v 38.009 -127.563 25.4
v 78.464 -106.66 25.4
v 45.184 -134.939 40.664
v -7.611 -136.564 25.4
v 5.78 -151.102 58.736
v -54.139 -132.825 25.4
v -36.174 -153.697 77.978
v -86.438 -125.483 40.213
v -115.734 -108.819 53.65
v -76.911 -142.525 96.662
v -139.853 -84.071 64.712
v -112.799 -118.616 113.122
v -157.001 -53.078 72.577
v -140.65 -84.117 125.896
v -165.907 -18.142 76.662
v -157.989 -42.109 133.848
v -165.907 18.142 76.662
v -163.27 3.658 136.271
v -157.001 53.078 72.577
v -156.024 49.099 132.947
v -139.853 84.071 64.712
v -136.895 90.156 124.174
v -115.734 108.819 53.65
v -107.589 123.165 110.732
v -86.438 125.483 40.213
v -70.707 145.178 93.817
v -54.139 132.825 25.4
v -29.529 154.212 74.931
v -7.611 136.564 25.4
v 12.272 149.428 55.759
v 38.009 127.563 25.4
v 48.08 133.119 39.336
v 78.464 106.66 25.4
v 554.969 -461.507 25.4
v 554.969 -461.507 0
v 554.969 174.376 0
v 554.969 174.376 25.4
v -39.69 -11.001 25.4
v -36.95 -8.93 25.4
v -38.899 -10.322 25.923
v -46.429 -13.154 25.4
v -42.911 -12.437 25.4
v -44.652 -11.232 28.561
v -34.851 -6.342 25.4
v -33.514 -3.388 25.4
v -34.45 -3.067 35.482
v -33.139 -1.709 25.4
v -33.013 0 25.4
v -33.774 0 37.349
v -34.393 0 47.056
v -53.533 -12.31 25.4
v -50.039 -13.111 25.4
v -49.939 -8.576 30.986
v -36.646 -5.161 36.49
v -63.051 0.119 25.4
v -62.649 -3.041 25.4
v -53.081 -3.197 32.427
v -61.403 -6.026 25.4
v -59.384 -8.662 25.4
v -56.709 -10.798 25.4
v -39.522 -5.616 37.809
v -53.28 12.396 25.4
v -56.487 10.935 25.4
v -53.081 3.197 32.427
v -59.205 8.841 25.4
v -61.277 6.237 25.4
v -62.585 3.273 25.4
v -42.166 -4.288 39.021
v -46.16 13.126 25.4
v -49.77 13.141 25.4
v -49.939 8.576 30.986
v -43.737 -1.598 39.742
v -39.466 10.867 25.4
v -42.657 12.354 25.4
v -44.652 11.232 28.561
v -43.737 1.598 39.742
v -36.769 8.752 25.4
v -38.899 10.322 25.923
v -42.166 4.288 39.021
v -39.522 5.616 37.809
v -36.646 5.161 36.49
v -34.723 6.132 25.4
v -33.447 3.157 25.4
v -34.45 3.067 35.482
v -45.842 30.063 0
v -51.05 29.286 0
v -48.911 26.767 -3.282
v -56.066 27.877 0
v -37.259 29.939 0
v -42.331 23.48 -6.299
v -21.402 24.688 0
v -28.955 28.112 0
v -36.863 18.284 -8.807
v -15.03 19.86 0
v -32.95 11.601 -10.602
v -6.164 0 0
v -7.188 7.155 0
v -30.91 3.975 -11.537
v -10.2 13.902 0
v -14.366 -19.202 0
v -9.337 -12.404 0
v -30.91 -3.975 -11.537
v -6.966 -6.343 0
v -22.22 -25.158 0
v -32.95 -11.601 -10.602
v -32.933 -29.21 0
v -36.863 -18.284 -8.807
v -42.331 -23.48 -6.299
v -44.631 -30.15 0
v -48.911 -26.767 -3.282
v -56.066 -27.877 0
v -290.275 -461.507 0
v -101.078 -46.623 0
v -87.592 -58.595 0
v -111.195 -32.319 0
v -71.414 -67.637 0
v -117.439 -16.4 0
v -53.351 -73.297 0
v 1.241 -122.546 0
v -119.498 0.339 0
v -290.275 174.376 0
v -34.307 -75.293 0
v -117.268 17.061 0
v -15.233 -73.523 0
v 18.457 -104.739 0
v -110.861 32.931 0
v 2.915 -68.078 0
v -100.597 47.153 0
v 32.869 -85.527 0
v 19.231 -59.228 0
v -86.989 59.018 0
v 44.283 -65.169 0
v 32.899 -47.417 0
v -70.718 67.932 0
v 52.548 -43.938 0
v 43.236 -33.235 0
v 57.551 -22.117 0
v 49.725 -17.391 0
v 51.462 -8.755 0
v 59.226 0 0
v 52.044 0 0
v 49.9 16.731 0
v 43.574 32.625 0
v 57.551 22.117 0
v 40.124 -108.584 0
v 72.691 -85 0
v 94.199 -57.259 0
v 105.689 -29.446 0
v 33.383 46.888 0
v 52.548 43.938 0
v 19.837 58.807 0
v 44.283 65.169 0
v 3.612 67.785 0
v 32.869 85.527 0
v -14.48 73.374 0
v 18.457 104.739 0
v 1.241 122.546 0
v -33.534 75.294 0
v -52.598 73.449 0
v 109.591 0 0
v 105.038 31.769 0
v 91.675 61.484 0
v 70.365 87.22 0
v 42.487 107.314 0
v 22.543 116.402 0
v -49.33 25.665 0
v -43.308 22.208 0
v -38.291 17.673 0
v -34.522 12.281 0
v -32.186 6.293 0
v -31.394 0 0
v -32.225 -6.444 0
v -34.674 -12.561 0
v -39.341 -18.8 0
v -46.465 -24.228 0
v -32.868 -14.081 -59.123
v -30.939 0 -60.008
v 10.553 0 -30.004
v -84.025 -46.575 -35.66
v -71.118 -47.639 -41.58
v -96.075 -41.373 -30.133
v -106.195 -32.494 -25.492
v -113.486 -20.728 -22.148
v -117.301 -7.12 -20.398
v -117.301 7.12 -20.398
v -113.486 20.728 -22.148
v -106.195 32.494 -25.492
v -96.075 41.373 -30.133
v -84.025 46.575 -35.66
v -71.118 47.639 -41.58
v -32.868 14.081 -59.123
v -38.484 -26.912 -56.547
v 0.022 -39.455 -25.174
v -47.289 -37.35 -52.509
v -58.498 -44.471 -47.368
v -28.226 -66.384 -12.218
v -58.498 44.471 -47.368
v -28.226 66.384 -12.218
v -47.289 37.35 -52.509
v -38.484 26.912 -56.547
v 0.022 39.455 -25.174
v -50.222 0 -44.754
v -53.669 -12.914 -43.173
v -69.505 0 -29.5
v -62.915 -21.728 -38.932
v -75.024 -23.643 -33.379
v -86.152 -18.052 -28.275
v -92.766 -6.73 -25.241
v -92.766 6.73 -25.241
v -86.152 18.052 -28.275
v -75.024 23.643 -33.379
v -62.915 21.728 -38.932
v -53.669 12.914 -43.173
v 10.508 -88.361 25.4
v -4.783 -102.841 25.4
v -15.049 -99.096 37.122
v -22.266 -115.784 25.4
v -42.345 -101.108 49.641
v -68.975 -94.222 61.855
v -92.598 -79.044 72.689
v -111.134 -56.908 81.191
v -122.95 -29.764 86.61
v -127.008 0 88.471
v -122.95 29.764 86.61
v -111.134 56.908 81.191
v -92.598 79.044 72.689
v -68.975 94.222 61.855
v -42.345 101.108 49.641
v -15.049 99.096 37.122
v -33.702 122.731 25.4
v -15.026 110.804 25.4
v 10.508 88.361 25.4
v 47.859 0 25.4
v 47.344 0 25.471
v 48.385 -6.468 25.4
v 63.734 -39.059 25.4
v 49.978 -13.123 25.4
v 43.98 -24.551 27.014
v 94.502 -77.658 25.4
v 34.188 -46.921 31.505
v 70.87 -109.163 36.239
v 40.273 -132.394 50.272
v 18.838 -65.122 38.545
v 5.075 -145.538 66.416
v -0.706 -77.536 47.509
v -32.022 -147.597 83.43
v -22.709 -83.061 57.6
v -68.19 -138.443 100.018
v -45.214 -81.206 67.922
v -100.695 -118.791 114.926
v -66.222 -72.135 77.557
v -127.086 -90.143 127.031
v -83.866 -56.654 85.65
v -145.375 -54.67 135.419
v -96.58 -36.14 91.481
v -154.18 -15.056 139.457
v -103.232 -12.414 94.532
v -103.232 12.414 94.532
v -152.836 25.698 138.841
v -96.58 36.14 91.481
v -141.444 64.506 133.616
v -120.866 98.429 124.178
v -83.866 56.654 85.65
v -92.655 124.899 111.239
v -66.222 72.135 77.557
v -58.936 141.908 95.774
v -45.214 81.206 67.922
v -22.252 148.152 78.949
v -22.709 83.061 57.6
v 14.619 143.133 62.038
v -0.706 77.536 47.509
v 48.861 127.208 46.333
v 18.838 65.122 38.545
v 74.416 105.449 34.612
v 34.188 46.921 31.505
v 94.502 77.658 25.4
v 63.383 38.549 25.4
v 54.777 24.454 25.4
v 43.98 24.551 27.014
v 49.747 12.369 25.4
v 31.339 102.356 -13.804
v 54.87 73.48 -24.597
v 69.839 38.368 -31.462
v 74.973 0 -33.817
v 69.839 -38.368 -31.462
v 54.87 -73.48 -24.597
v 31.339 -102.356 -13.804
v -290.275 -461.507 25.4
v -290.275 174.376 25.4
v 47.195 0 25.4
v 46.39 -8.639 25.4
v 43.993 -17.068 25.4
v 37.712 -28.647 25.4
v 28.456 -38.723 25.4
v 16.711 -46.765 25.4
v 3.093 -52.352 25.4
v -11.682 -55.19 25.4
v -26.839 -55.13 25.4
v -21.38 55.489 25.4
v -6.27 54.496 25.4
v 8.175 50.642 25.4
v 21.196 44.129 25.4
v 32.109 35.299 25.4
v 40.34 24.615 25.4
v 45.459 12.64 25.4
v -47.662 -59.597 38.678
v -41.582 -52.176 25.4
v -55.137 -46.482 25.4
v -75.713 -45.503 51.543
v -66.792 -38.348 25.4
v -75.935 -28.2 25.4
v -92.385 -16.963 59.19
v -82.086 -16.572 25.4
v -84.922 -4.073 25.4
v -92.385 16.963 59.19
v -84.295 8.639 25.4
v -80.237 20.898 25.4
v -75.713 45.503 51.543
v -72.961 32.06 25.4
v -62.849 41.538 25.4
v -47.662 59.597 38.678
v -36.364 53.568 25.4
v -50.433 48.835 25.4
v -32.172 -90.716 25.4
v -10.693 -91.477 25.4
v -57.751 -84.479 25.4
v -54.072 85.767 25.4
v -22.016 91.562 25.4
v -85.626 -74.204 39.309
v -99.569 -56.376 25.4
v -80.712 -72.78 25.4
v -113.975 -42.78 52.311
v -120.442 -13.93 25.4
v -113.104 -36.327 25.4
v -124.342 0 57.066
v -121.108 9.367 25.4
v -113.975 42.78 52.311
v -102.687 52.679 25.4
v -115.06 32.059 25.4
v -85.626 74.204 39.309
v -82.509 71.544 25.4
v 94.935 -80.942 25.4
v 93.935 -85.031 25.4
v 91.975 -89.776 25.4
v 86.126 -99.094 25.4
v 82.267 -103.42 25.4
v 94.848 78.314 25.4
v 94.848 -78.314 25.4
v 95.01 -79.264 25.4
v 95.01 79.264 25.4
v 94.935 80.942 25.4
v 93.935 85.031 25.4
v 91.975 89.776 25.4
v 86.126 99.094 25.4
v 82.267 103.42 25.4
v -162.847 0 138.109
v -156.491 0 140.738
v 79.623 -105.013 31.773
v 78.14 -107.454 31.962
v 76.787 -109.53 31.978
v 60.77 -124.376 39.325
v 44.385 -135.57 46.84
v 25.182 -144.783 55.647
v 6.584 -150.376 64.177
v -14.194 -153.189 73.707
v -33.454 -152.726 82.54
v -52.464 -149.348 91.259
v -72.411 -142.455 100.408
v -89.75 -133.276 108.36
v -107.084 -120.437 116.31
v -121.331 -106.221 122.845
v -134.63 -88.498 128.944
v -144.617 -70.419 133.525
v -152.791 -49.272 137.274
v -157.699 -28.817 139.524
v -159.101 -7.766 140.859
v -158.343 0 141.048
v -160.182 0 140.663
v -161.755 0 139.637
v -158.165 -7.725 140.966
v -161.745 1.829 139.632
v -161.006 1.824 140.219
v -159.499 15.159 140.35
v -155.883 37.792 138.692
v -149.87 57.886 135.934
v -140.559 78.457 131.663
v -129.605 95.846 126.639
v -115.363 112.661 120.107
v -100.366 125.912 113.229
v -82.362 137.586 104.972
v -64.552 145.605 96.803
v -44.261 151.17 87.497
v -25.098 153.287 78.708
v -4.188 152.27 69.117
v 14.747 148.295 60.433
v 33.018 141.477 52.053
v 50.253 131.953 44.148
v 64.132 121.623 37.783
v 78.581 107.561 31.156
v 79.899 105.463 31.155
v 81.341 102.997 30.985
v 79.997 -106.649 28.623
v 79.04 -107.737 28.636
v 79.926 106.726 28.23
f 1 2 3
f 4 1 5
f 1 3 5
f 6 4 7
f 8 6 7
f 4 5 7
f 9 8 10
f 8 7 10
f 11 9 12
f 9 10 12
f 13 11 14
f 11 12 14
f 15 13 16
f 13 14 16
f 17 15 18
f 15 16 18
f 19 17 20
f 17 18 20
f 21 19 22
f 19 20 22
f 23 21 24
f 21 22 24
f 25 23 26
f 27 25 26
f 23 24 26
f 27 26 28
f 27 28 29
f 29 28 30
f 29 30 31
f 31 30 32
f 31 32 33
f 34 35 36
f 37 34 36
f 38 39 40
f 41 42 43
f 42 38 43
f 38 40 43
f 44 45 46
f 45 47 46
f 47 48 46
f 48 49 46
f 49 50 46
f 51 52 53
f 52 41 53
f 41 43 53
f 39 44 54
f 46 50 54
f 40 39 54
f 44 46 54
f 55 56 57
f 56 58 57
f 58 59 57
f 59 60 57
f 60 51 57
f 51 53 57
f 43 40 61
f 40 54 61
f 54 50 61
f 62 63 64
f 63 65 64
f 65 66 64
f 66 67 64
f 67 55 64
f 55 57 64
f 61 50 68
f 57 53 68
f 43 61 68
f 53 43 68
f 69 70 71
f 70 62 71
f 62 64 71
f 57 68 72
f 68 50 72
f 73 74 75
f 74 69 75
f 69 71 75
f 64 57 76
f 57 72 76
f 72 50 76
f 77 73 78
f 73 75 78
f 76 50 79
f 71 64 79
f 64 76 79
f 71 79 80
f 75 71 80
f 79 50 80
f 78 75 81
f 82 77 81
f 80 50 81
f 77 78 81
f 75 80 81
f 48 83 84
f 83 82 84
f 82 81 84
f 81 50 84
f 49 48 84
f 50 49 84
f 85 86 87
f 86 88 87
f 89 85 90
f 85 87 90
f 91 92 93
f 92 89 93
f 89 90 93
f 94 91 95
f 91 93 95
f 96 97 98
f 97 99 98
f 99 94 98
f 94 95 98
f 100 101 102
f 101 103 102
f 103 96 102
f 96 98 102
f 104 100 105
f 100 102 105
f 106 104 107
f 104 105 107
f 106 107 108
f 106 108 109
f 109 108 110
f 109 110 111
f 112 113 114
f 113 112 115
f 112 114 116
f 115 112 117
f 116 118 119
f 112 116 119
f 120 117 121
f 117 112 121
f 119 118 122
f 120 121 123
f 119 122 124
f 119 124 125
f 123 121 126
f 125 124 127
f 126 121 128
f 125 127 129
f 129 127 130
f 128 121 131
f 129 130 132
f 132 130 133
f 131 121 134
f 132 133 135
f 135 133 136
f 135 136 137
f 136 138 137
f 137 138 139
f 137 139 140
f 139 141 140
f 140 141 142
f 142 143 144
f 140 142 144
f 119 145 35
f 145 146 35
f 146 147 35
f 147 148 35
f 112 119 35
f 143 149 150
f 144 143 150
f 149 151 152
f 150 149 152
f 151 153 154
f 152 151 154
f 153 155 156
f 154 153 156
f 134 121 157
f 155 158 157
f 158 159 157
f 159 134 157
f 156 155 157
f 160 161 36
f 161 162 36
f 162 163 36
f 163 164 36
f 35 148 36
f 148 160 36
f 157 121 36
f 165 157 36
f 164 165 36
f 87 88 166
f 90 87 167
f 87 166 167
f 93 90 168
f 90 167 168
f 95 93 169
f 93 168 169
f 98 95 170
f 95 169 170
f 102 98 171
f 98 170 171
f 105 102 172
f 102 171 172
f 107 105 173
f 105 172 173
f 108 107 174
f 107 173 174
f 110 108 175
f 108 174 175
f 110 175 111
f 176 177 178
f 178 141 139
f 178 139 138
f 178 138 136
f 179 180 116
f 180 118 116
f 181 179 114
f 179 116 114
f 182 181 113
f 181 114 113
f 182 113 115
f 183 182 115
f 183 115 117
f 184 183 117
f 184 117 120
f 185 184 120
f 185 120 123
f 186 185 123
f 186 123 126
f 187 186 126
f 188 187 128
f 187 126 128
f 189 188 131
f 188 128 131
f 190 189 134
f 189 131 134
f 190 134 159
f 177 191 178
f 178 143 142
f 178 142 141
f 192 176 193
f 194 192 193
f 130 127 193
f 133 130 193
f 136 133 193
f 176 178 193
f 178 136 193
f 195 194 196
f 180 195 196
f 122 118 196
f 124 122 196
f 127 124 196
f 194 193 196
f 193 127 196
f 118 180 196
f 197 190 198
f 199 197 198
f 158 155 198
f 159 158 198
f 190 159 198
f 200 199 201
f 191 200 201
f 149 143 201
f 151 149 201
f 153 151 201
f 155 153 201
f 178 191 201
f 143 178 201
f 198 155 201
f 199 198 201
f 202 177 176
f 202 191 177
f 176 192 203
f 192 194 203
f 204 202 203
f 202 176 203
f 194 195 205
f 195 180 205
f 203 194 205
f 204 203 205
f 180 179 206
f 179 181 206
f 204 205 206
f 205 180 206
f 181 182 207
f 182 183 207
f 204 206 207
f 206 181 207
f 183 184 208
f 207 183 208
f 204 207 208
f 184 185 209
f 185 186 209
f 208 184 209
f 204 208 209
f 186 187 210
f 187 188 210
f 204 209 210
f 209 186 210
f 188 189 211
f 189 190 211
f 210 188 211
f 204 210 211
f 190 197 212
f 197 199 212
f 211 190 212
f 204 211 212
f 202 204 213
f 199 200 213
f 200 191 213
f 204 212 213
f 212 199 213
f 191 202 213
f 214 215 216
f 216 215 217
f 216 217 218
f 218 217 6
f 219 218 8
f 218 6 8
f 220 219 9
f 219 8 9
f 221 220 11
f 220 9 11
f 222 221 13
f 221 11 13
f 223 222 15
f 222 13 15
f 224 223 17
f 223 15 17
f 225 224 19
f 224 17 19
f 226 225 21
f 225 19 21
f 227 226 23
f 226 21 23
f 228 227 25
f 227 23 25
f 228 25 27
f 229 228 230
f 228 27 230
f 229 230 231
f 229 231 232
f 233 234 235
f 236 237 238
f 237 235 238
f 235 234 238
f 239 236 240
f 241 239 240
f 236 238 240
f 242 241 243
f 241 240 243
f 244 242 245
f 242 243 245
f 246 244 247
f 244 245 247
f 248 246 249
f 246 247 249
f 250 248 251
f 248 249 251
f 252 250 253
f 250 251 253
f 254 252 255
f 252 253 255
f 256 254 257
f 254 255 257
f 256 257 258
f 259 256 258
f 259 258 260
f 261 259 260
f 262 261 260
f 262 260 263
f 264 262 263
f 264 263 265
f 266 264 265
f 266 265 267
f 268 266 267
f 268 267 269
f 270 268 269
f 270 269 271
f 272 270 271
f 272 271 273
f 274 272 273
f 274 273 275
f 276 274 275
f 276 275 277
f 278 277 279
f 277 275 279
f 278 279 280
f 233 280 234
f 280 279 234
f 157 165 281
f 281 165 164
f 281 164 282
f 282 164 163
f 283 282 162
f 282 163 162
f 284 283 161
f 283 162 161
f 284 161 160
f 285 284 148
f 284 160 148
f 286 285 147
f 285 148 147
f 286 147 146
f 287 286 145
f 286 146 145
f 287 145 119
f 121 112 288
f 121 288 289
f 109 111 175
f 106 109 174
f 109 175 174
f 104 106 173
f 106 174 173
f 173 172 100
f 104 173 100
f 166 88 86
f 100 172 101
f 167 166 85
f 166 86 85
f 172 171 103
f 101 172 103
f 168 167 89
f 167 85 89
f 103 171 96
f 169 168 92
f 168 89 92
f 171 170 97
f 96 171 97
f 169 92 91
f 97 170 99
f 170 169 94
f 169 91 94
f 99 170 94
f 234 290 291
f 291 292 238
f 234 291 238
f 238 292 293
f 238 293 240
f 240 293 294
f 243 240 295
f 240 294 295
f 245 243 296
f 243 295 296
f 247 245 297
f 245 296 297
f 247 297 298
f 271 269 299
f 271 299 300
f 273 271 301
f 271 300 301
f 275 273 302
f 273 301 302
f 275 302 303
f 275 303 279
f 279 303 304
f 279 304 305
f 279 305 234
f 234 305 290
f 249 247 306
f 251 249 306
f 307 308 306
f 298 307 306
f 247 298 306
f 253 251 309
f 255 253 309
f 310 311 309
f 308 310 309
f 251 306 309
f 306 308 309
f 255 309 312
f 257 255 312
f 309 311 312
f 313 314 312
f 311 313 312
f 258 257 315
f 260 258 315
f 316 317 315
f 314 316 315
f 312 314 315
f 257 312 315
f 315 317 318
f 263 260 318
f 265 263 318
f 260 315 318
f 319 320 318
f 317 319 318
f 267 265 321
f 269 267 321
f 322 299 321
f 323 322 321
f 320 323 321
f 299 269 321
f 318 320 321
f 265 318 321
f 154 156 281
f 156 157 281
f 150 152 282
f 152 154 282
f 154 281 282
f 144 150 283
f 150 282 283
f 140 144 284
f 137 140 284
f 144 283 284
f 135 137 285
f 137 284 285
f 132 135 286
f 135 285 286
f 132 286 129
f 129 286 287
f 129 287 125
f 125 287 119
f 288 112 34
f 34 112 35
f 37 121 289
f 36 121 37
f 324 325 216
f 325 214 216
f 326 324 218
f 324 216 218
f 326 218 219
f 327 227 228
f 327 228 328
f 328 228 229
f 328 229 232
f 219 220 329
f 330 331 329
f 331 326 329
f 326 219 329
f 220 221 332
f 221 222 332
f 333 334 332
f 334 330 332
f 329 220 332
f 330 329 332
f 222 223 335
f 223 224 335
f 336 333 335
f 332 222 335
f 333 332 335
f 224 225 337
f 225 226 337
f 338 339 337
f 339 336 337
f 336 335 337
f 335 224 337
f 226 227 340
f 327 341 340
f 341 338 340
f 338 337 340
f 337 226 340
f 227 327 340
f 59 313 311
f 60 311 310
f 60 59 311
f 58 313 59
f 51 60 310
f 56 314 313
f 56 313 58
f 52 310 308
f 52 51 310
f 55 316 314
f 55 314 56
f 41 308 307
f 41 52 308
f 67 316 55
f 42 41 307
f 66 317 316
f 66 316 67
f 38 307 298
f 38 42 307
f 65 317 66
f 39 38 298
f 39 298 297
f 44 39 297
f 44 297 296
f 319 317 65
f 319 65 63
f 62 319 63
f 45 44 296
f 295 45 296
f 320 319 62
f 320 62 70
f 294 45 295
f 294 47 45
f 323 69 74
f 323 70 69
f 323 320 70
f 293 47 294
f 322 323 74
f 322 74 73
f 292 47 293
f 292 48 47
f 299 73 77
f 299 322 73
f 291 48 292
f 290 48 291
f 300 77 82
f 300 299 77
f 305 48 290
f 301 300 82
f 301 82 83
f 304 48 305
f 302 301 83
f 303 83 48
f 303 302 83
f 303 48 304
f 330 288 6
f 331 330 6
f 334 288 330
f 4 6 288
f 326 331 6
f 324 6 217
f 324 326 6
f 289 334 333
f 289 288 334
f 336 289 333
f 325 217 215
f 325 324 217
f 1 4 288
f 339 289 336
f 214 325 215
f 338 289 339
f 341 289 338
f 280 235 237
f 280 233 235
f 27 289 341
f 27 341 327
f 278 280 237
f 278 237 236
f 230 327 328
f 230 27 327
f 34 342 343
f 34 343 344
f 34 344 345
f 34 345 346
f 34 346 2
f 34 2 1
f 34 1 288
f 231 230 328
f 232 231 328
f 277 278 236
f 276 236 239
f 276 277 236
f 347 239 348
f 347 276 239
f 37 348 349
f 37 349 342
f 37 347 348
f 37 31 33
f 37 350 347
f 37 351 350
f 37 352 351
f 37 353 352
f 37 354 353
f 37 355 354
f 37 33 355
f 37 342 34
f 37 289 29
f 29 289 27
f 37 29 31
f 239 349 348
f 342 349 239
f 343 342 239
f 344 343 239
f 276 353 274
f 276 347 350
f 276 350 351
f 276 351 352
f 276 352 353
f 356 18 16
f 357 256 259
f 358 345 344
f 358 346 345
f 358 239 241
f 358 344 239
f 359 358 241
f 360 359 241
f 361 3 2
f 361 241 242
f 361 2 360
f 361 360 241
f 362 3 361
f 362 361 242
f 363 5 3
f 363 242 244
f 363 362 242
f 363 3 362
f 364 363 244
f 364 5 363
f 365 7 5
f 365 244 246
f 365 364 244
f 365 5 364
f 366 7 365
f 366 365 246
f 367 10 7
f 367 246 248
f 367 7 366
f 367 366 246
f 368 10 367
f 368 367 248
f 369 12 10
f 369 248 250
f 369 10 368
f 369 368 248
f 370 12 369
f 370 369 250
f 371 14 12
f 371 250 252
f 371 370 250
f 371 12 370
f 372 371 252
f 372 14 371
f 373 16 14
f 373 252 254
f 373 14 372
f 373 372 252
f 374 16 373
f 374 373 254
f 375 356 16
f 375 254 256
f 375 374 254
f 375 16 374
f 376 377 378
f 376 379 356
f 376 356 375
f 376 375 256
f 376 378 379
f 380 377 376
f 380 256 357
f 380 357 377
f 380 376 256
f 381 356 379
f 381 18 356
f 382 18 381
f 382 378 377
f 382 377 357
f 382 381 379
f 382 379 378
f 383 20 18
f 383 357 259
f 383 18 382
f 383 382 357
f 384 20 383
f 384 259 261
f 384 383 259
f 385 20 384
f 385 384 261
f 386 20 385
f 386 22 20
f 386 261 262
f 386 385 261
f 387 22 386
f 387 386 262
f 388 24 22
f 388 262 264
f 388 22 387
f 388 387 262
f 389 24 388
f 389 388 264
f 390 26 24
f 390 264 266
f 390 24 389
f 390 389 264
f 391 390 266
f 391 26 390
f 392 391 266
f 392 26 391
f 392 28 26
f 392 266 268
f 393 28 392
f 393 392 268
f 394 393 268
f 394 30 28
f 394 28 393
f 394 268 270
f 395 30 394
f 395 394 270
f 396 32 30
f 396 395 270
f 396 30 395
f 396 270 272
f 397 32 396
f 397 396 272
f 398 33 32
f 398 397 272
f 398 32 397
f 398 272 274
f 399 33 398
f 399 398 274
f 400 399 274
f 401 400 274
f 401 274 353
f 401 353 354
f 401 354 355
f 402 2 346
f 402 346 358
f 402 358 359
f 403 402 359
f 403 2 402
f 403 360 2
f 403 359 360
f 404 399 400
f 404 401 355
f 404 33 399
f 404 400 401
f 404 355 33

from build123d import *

# Parameters (mm, degrees)
F2_R     = 5.08
F3_W     = 845.2445566654
F3_H     = 635.8838379383
F4_DEPTH = 25.4


with BuildPart() as f1:
    # F0 (on Front) → F1 (revolve)
    with BuildSketch(Plane.XZ):
        Polygon((-30.6513123214, -11.656133458), (-34.3927890062, 47.0562428236), (-69.5050880313, -29.5000895858), (-30.9391189367, -60.0075013936), (57.4172511697, 3.8853778969), (74.9733969569, -33.8171757758), (124.7637942433, 14.8219969124), (47.3440475762, 25.470810011), align=None)
    revolve(axis=Axis((-51.9489385188, 0, 8.7780766189), (-0.4168899853, 0, -0.9089569518)))

    # F2
    f2_edges = [f1.edges().sort_by_distance(p)[0] for p in [
        (-162.656787, 0, 146.64646),
    ]]
    fillet(f2_edges, radius=F2_R)

    # F3 (on Top) → F4 (join)
    with BuildSketch(Plane.XY):
        with Locations((132.3471516371, -143.5654908419)):
            Rectangle(F3_W, F3_H)
    extrude(amount=F4_DEPTH)


solid = f1.part
